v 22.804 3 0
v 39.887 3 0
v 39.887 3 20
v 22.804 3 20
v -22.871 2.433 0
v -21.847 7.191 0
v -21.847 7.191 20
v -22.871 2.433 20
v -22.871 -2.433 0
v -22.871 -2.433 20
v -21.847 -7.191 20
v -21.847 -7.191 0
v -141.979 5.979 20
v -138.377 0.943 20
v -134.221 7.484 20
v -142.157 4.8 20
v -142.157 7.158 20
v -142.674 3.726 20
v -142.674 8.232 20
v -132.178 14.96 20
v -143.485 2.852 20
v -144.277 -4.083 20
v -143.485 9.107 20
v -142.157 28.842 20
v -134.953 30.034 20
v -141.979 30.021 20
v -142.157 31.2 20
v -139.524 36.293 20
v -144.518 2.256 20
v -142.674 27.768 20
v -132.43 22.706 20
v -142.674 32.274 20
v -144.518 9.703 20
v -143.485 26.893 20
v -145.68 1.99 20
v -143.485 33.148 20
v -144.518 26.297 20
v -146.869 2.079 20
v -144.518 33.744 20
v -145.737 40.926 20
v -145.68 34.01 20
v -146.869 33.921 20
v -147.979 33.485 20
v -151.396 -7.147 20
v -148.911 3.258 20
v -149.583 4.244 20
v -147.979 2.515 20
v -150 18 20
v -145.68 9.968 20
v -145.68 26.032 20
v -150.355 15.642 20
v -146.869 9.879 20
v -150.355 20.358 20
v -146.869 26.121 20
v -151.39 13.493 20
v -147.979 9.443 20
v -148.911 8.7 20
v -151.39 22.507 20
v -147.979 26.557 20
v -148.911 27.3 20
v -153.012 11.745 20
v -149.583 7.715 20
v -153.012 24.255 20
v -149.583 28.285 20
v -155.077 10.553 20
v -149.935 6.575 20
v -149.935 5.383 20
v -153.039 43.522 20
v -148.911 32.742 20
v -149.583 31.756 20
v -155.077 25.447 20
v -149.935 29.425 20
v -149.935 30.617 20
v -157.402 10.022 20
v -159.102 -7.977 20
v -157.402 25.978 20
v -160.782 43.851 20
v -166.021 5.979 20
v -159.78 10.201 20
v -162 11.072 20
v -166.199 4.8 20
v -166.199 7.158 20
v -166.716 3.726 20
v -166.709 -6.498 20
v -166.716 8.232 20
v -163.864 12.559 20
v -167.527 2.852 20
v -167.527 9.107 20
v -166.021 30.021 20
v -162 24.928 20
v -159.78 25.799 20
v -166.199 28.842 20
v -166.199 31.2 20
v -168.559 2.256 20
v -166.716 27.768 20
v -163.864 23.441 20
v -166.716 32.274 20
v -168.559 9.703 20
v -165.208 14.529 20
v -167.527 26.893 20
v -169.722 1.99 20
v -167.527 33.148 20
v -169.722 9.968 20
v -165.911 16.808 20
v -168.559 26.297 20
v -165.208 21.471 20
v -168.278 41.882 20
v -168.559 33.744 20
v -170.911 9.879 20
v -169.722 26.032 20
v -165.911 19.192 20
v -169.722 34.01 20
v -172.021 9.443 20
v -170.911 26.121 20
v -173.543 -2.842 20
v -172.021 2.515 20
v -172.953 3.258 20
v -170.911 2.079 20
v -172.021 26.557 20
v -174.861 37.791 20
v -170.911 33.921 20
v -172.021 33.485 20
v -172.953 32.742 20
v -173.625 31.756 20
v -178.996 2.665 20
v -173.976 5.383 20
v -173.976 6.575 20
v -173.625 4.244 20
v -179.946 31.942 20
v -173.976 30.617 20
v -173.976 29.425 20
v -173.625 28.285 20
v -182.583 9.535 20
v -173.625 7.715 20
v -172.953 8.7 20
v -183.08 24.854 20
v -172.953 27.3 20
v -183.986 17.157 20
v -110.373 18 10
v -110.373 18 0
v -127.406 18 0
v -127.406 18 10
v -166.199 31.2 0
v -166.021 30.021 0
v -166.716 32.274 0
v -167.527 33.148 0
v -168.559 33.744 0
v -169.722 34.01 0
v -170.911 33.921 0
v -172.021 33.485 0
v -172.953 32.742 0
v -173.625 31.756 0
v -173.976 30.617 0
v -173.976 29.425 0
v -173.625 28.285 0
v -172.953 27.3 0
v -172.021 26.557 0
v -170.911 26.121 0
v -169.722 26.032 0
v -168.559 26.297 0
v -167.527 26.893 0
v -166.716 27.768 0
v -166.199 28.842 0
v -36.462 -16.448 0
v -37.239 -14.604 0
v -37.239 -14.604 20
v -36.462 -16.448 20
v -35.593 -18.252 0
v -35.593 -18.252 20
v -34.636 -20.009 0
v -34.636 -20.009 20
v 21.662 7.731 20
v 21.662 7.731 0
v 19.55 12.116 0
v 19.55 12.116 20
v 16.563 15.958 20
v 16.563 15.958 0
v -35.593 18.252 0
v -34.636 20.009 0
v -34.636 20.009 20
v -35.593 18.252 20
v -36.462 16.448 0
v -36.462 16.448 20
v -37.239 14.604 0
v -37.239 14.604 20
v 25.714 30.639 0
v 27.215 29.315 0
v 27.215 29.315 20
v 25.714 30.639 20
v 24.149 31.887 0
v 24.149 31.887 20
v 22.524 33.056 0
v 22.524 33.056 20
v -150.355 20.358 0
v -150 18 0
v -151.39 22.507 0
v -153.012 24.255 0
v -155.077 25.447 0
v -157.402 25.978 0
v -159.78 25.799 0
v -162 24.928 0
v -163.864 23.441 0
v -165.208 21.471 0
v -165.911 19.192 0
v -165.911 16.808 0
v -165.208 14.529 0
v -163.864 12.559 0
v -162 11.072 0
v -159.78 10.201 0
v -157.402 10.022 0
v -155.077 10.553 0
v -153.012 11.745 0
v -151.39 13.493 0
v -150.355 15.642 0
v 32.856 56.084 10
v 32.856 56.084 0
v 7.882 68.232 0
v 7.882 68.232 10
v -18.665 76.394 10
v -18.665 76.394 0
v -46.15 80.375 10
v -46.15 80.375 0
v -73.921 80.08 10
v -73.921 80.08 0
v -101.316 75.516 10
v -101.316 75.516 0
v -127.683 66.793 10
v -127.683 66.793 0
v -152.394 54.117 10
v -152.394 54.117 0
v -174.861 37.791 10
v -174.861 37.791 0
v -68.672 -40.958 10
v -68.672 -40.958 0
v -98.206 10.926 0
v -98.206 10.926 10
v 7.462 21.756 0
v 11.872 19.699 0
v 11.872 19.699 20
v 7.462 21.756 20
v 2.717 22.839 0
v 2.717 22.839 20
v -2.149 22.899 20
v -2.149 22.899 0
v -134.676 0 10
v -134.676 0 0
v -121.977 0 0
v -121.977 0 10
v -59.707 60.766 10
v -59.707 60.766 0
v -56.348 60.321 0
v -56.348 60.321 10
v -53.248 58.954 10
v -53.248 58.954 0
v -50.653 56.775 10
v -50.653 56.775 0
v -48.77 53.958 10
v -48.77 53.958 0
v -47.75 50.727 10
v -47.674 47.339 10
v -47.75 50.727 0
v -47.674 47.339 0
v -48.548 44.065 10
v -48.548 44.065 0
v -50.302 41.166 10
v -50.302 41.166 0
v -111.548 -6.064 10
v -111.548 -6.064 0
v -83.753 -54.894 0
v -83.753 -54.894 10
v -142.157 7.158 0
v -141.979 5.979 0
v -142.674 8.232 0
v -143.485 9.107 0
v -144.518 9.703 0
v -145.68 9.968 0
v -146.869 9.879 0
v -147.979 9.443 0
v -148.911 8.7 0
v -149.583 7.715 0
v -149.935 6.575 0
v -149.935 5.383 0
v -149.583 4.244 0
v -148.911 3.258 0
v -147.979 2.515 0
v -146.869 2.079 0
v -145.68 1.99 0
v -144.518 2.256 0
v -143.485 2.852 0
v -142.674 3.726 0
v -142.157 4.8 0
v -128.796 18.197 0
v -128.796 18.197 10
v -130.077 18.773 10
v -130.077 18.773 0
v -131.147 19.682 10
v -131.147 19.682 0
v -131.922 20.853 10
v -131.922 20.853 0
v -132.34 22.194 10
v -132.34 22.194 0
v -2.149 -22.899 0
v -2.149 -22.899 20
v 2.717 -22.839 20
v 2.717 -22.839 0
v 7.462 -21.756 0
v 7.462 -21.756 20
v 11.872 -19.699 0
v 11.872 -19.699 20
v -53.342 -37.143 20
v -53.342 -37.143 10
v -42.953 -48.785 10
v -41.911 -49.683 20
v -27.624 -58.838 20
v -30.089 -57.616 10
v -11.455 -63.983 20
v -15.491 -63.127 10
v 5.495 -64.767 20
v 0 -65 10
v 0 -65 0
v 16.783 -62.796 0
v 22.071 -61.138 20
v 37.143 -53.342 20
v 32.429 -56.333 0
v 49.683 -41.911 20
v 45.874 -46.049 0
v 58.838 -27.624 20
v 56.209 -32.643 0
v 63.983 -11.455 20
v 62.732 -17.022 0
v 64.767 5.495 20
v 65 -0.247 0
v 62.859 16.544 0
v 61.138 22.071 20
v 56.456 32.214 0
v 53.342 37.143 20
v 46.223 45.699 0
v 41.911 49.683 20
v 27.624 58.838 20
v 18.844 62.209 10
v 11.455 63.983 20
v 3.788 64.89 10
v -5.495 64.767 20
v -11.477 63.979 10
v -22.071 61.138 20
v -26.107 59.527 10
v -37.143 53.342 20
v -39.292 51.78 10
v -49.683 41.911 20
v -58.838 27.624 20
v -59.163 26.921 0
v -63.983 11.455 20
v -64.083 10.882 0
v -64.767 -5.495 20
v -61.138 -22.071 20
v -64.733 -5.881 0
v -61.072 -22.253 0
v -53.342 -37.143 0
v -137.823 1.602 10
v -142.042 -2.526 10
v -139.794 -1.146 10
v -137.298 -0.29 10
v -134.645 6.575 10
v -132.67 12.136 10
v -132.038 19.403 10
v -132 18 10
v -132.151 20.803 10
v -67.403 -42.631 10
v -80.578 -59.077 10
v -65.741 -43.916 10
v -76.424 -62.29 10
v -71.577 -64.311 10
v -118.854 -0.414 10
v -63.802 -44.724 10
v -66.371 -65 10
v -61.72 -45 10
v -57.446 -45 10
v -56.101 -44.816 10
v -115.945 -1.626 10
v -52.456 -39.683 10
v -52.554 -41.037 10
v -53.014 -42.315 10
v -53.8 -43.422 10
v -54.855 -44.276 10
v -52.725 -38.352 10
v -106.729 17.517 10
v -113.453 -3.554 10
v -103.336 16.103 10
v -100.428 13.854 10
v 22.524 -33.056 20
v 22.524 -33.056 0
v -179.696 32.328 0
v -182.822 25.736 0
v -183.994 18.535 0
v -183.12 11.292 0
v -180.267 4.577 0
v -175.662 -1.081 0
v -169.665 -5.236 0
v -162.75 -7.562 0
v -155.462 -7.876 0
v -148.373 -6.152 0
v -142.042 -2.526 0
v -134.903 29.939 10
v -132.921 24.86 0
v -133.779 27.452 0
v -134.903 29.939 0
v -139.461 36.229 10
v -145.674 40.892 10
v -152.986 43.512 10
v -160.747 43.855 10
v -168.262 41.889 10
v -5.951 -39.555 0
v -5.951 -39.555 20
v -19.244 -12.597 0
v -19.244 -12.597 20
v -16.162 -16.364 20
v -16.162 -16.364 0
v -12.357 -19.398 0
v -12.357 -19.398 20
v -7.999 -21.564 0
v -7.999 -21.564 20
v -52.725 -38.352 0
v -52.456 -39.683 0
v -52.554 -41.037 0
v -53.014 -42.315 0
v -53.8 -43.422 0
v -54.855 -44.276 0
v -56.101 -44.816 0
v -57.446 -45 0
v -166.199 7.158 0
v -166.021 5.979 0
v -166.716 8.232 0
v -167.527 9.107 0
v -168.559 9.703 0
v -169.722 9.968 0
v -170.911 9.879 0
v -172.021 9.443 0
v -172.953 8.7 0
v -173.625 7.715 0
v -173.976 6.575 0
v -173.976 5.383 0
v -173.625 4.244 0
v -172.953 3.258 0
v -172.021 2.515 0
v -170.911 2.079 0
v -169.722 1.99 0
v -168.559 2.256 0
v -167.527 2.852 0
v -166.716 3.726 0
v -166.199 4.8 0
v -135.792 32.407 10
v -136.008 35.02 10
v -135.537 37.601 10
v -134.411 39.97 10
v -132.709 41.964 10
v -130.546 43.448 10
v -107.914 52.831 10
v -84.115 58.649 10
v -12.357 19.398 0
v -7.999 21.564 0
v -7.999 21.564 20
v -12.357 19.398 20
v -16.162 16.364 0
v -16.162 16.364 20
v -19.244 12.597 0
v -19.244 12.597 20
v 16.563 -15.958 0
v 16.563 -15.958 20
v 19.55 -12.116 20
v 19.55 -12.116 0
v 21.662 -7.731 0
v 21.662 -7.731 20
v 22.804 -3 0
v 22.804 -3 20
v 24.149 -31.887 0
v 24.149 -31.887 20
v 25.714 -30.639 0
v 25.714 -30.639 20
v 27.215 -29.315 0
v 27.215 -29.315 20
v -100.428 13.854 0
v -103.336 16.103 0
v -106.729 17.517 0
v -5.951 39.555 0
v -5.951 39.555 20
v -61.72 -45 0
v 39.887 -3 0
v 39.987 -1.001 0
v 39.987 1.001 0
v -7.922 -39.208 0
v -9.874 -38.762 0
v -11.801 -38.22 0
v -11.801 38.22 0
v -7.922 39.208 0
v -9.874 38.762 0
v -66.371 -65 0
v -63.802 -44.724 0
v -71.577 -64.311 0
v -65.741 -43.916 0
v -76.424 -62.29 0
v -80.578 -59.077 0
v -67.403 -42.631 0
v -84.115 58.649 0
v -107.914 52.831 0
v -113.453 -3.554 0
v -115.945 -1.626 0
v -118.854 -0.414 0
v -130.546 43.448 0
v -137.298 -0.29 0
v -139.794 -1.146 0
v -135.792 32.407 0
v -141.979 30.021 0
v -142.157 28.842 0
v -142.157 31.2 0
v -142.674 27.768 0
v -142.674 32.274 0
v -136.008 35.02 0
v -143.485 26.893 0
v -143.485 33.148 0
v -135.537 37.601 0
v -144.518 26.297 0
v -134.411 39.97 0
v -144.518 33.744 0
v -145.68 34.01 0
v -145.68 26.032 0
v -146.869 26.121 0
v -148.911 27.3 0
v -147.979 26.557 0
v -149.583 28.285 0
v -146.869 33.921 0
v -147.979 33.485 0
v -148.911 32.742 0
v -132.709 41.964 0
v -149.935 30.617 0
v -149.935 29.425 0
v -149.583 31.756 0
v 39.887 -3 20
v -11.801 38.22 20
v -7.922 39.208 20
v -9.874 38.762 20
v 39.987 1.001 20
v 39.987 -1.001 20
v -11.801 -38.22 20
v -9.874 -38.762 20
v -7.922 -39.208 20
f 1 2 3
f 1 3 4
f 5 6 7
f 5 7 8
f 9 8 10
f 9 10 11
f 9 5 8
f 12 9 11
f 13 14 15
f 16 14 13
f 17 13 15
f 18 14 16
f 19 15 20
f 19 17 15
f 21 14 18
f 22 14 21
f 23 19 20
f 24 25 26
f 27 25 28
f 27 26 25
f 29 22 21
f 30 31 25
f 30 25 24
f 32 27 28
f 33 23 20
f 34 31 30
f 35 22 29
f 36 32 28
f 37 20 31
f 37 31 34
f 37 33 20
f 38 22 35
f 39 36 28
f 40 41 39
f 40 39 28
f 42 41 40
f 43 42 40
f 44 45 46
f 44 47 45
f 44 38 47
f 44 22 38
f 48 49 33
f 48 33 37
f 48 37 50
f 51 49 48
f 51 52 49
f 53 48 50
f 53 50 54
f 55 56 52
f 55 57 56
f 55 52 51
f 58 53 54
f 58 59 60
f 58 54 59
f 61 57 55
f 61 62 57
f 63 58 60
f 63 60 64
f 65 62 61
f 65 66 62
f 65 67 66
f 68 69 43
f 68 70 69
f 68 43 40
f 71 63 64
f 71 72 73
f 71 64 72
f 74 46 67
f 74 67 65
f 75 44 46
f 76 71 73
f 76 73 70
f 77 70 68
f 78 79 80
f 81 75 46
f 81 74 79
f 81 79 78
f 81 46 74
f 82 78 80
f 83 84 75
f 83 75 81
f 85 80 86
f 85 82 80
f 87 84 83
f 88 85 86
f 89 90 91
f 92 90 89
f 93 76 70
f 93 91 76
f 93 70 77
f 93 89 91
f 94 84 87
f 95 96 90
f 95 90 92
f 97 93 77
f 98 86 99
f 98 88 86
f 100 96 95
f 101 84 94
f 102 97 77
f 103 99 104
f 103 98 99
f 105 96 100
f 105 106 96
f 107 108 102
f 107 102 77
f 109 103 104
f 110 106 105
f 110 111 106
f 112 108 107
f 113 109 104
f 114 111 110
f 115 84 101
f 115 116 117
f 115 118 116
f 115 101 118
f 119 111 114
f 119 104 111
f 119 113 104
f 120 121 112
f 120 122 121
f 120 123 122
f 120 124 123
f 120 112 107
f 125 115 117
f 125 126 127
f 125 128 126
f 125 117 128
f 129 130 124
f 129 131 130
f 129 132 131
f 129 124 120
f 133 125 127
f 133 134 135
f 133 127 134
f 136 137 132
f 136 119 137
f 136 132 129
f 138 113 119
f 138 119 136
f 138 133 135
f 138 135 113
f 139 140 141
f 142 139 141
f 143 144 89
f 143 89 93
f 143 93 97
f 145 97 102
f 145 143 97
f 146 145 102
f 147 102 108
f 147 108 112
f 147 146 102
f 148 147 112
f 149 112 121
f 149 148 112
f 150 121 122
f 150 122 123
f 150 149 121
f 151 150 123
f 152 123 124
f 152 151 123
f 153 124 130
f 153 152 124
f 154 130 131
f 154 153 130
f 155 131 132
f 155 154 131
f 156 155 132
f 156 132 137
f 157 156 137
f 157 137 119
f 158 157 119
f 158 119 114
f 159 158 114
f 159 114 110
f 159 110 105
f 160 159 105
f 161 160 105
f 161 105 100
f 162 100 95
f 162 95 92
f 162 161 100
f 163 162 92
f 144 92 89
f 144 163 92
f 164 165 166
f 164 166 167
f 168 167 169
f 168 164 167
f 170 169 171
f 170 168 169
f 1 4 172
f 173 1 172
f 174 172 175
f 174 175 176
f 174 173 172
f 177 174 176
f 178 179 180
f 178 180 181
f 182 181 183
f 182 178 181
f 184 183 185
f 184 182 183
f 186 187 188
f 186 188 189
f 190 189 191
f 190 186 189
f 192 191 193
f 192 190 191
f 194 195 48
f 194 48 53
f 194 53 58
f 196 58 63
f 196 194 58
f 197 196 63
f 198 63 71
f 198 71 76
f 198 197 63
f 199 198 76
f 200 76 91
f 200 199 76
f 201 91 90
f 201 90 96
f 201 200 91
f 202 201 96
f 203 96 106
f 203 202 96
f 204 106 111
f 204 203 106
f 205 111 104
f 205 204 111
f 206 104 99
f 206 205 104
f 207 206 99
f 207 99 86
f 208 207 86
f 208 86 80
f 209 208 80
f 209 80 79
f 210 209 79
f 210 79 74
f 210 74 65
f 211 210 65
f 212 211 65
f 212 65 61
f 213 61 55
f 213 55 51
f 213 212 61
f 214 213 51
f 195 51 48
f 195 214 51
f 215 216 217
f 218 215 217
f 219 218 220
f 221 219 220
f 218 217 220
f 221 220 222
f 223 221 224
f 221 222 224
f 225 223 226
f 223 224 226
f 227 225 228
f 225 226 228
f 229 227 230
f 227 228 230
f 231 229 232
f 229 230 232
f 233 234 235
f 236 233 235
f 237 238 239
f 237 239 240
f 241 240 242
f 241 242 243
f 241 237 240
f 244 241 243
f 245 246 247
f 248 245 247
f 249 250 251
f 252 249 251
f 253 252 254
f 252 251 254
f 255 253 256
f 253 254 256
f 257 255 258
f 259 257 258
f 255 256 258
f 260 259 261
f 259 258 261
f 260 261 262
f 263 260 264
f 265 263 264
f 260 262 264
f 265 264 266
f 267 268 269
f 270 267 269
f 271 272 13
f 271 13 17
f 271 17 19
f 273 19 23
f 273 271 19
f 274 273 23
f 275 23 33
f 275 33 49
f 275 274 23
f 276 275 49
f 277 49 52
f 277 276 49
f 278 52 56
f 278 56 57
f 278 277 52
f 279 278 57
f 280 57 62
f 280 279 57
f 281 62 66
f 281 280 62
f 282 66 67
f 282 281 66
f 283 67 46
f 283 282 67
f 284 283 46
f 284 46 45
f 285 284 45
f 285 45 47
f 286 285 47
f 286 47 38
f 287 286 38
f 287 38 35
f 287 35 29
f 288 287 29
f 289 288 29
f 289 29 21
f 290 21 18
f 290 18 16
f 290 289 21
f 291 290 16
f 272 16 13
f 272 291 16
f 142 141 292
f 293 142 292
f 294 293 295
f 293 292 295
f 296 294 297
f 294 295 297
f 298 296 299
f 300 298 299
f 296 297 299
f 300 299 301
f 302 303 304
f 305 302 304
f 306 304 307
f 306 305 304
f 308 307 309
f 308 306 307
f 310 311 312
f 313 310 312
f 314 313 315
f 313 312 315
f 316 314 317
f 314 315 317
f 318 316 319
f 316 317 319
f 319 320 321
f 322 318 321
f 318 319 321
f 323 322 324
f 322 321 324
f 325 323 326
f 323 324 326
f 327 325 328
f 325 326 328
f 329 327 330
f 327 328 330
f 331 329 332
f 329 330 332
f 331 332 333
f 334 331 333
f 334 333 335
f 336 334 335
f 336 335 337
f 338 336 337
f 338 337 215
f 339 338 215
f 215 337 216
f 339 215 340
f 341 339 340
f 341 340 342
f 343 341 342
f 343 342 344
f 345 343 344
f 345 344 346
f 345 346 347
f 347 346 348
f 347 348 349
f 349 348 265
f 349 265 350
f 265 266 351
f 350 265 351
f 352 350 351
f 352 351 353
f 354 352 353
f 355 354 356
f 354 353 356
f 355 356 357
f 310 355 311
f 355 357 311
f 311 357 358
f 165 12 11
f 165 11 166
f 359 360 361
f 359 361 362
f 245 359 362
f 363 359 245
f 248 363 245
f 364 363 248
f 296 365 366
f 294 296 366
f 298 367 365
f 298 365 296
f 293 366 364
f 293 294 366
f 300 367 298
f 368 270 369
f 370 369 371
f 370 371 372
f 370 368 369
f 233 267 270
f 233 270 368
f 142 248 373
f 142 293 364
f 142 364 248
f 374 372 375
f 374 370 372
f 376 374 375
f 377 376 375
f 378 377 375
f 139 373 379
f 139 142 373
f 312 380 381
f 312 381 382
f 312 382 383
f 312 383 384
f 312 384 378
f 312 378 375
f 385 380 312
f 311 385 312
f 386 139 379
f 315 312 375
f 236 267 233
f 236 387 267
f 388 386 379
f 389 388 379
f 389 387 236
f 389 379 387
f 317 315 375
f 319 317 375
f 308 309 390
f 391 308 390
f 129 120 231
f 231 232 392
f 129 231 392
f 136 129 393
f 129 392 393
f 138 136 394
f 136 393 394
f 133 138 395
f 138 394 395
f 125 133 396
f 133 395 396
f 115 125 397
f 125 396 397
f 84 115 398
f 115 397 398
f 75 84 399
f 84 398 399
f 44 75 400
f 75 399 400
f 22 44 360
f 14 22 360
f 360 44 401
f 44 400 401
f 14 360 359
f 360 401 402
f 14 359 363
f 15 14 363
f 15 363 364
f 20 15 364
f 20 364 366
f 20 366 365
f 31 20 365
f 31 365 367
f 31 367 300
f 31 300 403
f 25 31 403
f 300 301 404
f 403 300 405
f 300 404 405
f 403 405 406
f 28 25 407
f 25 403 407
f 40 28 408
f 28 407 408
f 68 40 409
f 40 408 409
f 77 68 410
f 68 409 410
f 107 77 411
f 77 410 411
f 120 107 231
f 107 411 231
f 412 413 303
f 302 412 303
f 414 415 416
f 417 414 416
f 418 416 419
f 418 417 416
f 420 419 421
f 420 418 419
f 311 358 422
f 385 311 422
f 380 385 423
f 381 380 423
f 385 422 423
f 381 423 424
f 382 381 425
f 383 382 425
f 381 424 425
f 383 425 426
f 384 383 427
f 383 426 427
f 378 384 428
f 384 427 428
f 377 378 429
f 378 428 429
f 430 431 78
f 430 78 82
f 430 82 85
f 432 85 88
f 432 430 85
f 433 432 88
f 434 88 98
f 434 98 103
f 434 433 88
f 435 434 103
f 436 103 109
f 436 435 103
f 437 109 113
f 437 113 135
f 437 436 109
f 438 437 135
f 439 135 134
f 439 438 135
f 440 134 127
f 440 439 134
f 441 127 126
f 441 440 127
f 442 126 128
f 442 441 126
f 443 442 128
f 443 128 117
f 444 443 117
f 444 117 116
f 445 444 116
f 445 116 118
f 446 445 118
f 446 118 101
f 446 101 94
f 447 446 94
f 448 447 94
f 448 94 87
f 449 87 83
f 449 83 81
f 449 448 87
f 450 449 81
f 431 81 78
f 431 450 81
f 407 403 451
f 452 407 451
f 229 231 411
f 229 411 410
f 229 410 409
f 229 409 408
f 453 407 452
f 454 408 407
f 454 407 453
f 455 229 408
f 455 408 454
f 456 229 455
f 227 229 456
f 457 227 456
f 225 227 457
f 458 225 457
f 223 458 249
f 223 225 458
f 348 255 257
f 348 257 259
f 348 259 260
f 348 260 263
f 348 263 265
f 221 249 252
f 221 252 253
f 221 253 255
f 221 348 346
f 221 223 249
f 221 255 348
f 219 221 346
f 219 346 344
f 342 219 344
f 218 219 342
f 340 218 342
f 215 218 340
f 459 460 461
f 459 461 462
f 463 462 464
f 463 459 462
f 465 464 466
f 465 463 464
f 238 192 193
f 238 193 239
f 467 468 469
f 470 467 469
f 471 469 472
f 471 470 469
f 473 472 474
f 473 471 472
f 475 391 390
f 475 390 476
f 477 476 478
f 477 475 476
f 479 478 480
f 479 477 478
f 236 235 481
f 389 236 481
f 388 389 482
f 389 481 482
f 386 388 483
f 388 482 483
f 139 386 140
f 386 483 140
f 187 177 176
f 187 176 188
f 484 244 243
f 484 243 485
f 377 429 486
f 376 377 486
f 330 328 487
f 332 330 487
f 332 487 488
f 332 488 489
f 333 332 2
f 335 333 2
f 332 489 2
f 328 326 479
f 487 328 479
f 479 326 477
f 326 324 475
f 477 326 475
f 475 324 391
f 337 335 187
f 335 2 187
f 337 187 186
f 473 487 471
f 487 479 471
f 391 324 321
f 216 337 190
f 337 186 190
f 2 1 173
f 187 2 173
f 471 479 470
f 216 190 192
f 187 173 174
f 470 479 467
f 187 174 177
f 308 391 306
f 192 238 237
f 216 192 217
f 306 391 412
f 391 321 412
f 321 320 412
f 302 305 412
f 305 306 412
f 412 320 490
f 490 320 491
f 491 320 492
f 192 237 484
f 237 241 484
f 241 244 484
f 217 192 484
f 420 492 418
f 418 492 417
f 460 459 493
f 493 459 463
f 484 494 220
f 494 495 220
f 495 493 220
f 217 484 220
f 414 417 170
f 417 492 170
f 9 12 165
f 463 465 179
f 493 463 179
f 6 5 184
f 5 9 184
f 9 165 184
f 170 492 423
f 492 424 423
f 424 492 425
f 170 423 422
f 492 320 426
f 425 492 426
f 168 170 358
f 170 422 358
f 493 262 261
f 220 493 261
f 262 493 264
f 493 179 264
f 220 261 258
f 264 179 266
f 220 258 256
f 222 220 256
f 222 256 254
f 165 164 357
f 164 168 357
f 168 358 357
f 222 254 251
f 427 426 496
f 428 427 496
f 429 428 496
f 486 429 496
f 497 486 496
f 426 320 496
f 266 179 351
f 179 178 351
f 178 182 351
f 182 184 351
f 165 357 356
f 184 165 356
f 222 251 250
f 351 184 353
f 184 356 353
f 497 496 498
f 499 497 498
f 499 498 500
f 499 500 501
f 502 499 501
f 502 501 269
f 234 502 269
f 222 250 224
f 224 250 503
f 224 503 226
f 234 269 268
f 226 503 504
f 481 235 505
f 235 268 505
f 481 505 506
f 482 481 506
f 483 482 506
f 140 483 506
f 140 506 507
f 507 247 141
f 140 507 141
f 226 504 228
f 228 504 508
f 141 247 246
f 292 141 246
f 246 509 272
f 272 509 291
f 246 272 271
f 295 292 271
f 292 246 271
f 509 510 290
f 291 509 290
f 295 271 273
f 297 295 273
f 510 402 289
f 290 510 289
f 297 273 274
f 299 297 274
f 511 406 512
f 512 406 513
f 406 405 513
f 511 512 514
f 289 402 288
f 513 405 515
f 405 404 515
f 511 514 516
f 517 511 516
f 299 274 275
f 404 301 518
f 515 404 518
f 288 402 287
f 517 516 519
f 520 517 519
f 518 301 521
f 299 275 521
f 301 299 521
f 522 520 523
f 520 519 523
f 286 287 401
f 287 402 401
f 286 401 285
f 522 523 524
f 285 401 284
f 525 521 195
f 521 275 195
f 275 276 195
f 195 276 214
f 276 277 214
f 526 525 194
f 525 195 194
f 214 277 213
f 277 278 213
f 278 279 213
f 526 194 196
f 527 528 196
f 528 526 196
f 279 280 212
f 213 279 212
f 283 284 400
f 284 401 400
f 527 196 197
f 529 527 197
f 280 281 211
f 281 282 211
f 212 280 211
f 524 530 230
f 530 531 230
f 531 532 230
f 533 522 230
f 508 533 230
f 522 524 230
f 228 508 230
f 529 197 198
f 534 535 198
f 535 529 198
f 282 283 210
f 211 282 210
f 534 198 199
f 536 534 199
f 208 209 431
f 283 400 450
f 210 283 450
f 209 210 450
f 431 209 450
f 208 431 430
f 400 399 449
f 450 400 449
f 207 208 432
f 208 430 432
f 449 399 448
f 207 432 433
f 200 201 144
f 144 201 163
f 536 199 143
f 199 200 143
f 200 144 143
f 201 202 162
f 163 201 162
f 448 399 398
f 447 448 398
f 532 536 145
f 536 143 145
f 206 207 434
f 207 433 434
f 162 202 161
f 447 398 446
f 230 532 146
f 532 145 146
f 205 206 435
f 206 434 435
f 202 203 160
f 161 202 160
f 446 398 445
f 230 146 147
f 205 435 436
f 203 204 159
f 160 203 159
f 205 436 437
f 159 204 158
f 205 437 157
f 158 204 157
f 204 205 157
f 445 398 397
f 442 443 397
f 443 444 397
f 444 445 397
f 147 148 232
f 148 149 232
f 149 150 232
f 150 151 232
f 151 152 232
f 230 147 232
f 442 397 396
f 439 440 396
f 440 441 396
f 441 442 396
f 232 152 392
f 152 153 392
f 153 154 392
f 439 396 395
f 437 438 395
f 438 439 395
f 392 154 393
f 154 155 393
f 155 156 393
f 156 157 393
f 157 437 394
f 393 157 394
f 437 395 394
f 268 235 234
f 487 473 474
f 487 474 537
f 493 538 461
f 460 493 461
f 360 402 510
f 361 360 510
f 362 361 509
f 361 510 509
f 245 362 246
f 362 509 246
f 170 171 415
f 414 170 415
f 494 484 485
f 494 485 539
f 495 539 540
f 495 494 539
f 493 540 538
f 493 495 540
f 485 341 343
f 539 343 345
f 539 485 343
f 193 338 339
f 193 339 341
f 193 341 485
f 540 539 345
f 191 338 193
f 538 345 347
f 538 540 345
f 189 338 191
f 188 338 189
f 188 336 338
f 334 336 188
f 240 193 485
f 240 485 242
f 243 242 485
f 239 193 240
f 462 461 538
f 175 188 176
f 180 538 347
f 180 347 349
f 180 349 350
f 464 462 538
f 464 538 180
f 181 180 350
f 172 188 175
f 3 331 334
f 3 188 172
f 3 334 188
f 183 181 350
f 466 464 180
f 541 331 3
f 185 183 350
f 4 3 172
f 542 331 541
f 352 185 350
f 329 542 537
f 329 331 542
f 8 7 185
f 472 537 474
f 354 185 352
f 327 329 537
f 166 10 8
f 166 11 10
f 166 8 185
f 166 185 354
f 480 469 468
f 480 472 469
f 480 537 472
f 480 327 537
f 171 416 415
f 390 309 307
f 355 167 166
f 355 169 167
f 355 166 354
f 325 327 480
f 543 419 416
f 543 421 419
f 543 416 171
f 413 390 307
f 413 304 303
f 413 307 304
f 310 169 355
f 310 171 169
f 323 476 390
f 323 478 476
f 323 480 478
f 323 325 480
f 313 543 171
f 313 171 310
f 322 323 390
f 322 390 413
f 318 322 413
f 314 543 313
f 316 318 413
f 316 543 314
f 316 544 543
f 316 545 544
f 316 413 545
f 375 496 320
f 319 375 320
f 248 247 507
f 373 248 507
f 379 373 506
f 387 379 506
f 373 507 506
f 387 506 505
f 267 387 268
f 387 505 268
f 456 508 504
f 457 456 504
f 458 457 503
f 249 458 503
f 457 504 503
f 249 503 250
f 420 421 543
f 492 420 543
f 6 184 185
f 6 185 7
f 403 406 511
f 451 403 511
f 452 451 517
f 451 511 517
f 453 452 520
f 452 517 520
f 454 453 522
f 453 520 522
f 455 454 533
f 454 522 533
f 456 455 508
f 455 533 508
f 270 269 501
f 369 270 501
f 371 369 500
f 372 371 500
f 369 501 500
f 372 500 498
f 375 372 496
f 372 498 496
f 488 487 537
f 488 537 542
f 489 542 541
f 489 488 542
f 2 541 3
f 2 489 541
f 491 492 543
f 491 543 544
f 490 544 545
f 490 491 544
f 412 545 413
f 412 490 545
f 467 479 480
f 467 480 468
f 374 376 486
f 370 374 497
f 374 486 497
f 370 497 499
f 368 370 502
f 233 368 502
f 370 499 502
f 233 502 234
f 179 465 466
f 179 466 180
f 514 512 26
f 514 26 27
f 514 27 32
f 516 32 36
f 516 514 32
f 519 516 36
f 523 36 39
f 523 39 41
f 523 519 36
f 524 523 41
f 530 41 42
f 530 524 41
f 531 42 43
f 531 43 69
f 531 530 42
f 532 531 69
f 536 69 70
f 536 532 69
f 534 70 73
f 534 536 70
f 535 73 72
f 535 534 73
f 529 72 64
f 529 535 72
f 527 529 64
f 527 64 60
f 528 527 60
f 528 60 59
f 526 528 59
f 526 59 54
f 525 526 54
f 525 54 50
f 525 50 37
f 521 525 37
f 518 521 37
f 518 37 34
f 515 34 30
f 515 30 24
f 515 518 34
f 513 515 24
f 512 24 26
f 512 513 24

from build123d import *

# Parameters (mm, degrees)
EXTRUDE_1_DEPTH   = 10
EXTRUDE_1_2_DEPTH = 10
SKETCH_2_3_R      = 65
SKETCH_2_3_R_2    = 26
SKETCH_2_3_R_3    = 4
SKETCH_2_3_R_4    = 8
EXTRUDE_2_DEPTH   = 20


with BuildPart() as part:
    # Эскиз2 → Бобышка-Вытянуть1 (new body)
    with BuildSketch(Plane.XY):
        with BuildLine():
            Line((-66.371369906, -65), (0, -65))
            ThreePointArc((0, -65), (-30.089153243, -57.616341928), (-53.342367432, -37.142857143))
            ThreePointArc((-53.342367432, -37.142857143), (-53.013600163, -42.314550249), (-57.445626465, -45))
            Line((-57.445626465, -45), (-61.719917869, -45))
            ThreePointArc((-61.719917869, -45), (-65.741068408, -43.915948839), (-68.67243572, -40.957587084))
            Line((-68.67243572, -40.957587084), (-98.206043194, 10.925777398))
            ThreePointArc((-98.206043194, 10.925777398), (-103.335935989, 16.102910468), (-110.372949433, 18))
            Line((-110.372949433, 18), (-127.405882918, 18))
            ThreePointArc((-127.405882918, 18), (-130.643763547, 19.18999619), (-132.340417932, 22.193548387))
            ThreePointArc((-132.340417932, 22.193548387), (-133.797067988, 8.501680041), (-142.04160534, -2.526315789))
            ThreePointArc((-142.04160534, -2.526315789), (-138.569506528, -0.649136365), (-134.676192421, 0))
            Line((-134.676192421, 0), (-121.977178056, 0))
            ThreePointArc((-121.977178056, 0), (-115.945452247, -1.626076742), (-111.54840128, -6.063619373))
            Line((-111.54840128, -6.063619373), (-83.752664534, -54.893967711))
            ThreePointArc((-83.752664534, -54.893967711), (-76.424246255, -62.289872096), (-66.371369906, -65))
        make_face()
    extrude(amount=EXTRUDE_1_DEPTH)



with BuildPart() as body_2:
    # Эскиз2 → Extrude 1 2 (new body)
    with BuildSketch(Plane.XY):
        with BuildLine():
            ThreePointArc((-59.707166842, 60.765834645), (-48.770005737, 53.957911858), (-50.302314794, 41.166456325))
            ThreePointArc((-50.302314794, 41.166456325), (-11.477303942, 63.978679997), (32.856212496, 56.084483598))
            ThreePointArc((32.856212496, 56.084483598), (-73.921140449, 80.079620615), (-174.861132012, 37.791468547))
            ThreePointArc((-174.861132012, 37.791468547), (-152.986381903, 43.512029194), (-134.903213902, 29.93894769))
            ThreePointArc((-134.903213902, 29.93894769), (-135.536993635, 37.600652682), (-130.545808802, 43.448000294))
            ThreePointArc((-130.545808802, 43.448000294), (-96.126281422, 56.196575534), (-59.707166842, 60.765834645))
        make_face()
    extrude(amount=EXTRUDE_1_2_DEPTH)


with BuildPart() as part_1:
    add(part.part)

    add(body_2.part)  # Бобышка-Вытянуть2 merges body 2
    # Эскиз2<3> → Бобышка-Вытянуть2 (add)
    # profile 1 of 2: a face of its own
    with BuildSketch(Plane.XY):
        Circle(SKETCH_2_3_R)
        with BuildLine():
            Line((22.803508502, 3), (39.88734135, 3))
            ThreePointArc((39.88734135, 3), (40, 0), (39.88734135, -3))
            Line((39.88734135, -3), (22.803508502, -3))
            ThreePointArc((22.803508502, -3), (20.722283962, -9.979326), (16.563249445, -15.958031452))
            Line((16.563249445, -15.958031452), (27.214845003, -29.314709814))
            ThreePointArc((27.214845003, -29.314709814), (24.939592074, -31.273259299), (22.523856108, -33.055648625))
            Line((22.523856108, -33.055648625), (11.87226055, -19.698970263))
            ThreePointArc((11.87226055, -19.698970263), (5.117981481, -22.42334198), (-2.149474273, -22.899339736))
            Line((-2.149474273, -22.899339736), (-5.950984714, -39.554845227))
            ThreePointArc((-5.950984714, -39.554845227), (-8.900837358, -38.997116487), (-11.800552187, -38.219719623))
            Line((-11.800552187, -38.219719623), (-7.999041746, -21.564214132))
            ThreePointArc((-7.999041746, -21.564214132), (-14.340265443, -17.982124097), (-19.243600022, -12.596978138))
            Line((-19.243600022, -12.596978138), (-34.635601563, -20.009375412))
            ThreePointArc((-34.635601563, -20.009375412), (-36.038754716, -17.355349565), (-37.238903997, -14.603562205))
            Line((-37.238903997, -14.603562205), (-21.846902457, -7.19116493))
            ThreePointArc((-21.846902457, -7.19116493), (-23, 0), (-21.846902457, 7.19116493))
            Line((-21.846902457, 7.19116493), (-37.238903997, 14.603562205))
            ThreePointArc((-37.238903997, 14.603562205), (-36.038754716, 17.355349565), (-34.635601563, 20.009375412))
            Line((-34.635601563, 20.009375412), (-19.243600022, 12.596978138))
            ThreePointArc((-19.243600022, 12.596978138), (-14.340265443, 17.982124097), (-7.999041746, 21.564214132))
            Line((-7.999041746, 21.564214132), (-11.800552187, 38.219719623))
            ThreePointArc((-11.800552187, 38.219719623), (-8.900837358, 38.997116487), (-5.950984714, 39.554845227))
            Line((-5.950984714, 39.554845227), (-2.149474273, 22.899339736))
            ThreePointArc((-2.149474273, 22.899339736), (5.117981481, 22.42334198), (11.87226055, 19.698970263))
            Line((11.87226055, 19.698970263), (22.523856108, 33.055648625))
            ThreePointArc((22.523856108, 33.055648625), (24.939592074, 31.273259299), (27.214845003, 29.314709814))
            Line((27.214845003, 29.314709814), (16.563249445, 15.958031452))
            ThreePointArc((16.563249445, 15.958031452), (20.722283962, 9.979326), (22.803508502, 3))
        make_face(mode=Mode.SUBTRACT)
    # profile 2 of 2: a face of its own
    with BuildSketch(Plane.XY):
        with Locations((-158, 18)):
            Circle(SKETCH_2_3_R_2)
        with Locations((-170.02081528, 5.97918472)):
            Circle(SKETCH_2_3_R_3, mode=Mode.SUBTRACT)
        with Locations((-145.97918472, 5.97918472)):
            Circle(SKETCH_2_3_R_3, mode=Mode.SUBTRACT)
        with Locations((-158, 18)):
            Circle(SKETCH_2_3_R_4, mode=Mode.SUBTRACT)
        with Locations((-170.02081528, 30.02081528)):
            Circle(SKETCH_2_3_R_3, mode=Mode.SUBTRACT)
        with Locations((-145.97918472, 30.02081528)):
            Circle(SKETCH_2_3_R_3, mode=Mode.SUBTRACT)
    extrude(amount=EXTRUDE_2_DEPTH)


solid = part_1.part
